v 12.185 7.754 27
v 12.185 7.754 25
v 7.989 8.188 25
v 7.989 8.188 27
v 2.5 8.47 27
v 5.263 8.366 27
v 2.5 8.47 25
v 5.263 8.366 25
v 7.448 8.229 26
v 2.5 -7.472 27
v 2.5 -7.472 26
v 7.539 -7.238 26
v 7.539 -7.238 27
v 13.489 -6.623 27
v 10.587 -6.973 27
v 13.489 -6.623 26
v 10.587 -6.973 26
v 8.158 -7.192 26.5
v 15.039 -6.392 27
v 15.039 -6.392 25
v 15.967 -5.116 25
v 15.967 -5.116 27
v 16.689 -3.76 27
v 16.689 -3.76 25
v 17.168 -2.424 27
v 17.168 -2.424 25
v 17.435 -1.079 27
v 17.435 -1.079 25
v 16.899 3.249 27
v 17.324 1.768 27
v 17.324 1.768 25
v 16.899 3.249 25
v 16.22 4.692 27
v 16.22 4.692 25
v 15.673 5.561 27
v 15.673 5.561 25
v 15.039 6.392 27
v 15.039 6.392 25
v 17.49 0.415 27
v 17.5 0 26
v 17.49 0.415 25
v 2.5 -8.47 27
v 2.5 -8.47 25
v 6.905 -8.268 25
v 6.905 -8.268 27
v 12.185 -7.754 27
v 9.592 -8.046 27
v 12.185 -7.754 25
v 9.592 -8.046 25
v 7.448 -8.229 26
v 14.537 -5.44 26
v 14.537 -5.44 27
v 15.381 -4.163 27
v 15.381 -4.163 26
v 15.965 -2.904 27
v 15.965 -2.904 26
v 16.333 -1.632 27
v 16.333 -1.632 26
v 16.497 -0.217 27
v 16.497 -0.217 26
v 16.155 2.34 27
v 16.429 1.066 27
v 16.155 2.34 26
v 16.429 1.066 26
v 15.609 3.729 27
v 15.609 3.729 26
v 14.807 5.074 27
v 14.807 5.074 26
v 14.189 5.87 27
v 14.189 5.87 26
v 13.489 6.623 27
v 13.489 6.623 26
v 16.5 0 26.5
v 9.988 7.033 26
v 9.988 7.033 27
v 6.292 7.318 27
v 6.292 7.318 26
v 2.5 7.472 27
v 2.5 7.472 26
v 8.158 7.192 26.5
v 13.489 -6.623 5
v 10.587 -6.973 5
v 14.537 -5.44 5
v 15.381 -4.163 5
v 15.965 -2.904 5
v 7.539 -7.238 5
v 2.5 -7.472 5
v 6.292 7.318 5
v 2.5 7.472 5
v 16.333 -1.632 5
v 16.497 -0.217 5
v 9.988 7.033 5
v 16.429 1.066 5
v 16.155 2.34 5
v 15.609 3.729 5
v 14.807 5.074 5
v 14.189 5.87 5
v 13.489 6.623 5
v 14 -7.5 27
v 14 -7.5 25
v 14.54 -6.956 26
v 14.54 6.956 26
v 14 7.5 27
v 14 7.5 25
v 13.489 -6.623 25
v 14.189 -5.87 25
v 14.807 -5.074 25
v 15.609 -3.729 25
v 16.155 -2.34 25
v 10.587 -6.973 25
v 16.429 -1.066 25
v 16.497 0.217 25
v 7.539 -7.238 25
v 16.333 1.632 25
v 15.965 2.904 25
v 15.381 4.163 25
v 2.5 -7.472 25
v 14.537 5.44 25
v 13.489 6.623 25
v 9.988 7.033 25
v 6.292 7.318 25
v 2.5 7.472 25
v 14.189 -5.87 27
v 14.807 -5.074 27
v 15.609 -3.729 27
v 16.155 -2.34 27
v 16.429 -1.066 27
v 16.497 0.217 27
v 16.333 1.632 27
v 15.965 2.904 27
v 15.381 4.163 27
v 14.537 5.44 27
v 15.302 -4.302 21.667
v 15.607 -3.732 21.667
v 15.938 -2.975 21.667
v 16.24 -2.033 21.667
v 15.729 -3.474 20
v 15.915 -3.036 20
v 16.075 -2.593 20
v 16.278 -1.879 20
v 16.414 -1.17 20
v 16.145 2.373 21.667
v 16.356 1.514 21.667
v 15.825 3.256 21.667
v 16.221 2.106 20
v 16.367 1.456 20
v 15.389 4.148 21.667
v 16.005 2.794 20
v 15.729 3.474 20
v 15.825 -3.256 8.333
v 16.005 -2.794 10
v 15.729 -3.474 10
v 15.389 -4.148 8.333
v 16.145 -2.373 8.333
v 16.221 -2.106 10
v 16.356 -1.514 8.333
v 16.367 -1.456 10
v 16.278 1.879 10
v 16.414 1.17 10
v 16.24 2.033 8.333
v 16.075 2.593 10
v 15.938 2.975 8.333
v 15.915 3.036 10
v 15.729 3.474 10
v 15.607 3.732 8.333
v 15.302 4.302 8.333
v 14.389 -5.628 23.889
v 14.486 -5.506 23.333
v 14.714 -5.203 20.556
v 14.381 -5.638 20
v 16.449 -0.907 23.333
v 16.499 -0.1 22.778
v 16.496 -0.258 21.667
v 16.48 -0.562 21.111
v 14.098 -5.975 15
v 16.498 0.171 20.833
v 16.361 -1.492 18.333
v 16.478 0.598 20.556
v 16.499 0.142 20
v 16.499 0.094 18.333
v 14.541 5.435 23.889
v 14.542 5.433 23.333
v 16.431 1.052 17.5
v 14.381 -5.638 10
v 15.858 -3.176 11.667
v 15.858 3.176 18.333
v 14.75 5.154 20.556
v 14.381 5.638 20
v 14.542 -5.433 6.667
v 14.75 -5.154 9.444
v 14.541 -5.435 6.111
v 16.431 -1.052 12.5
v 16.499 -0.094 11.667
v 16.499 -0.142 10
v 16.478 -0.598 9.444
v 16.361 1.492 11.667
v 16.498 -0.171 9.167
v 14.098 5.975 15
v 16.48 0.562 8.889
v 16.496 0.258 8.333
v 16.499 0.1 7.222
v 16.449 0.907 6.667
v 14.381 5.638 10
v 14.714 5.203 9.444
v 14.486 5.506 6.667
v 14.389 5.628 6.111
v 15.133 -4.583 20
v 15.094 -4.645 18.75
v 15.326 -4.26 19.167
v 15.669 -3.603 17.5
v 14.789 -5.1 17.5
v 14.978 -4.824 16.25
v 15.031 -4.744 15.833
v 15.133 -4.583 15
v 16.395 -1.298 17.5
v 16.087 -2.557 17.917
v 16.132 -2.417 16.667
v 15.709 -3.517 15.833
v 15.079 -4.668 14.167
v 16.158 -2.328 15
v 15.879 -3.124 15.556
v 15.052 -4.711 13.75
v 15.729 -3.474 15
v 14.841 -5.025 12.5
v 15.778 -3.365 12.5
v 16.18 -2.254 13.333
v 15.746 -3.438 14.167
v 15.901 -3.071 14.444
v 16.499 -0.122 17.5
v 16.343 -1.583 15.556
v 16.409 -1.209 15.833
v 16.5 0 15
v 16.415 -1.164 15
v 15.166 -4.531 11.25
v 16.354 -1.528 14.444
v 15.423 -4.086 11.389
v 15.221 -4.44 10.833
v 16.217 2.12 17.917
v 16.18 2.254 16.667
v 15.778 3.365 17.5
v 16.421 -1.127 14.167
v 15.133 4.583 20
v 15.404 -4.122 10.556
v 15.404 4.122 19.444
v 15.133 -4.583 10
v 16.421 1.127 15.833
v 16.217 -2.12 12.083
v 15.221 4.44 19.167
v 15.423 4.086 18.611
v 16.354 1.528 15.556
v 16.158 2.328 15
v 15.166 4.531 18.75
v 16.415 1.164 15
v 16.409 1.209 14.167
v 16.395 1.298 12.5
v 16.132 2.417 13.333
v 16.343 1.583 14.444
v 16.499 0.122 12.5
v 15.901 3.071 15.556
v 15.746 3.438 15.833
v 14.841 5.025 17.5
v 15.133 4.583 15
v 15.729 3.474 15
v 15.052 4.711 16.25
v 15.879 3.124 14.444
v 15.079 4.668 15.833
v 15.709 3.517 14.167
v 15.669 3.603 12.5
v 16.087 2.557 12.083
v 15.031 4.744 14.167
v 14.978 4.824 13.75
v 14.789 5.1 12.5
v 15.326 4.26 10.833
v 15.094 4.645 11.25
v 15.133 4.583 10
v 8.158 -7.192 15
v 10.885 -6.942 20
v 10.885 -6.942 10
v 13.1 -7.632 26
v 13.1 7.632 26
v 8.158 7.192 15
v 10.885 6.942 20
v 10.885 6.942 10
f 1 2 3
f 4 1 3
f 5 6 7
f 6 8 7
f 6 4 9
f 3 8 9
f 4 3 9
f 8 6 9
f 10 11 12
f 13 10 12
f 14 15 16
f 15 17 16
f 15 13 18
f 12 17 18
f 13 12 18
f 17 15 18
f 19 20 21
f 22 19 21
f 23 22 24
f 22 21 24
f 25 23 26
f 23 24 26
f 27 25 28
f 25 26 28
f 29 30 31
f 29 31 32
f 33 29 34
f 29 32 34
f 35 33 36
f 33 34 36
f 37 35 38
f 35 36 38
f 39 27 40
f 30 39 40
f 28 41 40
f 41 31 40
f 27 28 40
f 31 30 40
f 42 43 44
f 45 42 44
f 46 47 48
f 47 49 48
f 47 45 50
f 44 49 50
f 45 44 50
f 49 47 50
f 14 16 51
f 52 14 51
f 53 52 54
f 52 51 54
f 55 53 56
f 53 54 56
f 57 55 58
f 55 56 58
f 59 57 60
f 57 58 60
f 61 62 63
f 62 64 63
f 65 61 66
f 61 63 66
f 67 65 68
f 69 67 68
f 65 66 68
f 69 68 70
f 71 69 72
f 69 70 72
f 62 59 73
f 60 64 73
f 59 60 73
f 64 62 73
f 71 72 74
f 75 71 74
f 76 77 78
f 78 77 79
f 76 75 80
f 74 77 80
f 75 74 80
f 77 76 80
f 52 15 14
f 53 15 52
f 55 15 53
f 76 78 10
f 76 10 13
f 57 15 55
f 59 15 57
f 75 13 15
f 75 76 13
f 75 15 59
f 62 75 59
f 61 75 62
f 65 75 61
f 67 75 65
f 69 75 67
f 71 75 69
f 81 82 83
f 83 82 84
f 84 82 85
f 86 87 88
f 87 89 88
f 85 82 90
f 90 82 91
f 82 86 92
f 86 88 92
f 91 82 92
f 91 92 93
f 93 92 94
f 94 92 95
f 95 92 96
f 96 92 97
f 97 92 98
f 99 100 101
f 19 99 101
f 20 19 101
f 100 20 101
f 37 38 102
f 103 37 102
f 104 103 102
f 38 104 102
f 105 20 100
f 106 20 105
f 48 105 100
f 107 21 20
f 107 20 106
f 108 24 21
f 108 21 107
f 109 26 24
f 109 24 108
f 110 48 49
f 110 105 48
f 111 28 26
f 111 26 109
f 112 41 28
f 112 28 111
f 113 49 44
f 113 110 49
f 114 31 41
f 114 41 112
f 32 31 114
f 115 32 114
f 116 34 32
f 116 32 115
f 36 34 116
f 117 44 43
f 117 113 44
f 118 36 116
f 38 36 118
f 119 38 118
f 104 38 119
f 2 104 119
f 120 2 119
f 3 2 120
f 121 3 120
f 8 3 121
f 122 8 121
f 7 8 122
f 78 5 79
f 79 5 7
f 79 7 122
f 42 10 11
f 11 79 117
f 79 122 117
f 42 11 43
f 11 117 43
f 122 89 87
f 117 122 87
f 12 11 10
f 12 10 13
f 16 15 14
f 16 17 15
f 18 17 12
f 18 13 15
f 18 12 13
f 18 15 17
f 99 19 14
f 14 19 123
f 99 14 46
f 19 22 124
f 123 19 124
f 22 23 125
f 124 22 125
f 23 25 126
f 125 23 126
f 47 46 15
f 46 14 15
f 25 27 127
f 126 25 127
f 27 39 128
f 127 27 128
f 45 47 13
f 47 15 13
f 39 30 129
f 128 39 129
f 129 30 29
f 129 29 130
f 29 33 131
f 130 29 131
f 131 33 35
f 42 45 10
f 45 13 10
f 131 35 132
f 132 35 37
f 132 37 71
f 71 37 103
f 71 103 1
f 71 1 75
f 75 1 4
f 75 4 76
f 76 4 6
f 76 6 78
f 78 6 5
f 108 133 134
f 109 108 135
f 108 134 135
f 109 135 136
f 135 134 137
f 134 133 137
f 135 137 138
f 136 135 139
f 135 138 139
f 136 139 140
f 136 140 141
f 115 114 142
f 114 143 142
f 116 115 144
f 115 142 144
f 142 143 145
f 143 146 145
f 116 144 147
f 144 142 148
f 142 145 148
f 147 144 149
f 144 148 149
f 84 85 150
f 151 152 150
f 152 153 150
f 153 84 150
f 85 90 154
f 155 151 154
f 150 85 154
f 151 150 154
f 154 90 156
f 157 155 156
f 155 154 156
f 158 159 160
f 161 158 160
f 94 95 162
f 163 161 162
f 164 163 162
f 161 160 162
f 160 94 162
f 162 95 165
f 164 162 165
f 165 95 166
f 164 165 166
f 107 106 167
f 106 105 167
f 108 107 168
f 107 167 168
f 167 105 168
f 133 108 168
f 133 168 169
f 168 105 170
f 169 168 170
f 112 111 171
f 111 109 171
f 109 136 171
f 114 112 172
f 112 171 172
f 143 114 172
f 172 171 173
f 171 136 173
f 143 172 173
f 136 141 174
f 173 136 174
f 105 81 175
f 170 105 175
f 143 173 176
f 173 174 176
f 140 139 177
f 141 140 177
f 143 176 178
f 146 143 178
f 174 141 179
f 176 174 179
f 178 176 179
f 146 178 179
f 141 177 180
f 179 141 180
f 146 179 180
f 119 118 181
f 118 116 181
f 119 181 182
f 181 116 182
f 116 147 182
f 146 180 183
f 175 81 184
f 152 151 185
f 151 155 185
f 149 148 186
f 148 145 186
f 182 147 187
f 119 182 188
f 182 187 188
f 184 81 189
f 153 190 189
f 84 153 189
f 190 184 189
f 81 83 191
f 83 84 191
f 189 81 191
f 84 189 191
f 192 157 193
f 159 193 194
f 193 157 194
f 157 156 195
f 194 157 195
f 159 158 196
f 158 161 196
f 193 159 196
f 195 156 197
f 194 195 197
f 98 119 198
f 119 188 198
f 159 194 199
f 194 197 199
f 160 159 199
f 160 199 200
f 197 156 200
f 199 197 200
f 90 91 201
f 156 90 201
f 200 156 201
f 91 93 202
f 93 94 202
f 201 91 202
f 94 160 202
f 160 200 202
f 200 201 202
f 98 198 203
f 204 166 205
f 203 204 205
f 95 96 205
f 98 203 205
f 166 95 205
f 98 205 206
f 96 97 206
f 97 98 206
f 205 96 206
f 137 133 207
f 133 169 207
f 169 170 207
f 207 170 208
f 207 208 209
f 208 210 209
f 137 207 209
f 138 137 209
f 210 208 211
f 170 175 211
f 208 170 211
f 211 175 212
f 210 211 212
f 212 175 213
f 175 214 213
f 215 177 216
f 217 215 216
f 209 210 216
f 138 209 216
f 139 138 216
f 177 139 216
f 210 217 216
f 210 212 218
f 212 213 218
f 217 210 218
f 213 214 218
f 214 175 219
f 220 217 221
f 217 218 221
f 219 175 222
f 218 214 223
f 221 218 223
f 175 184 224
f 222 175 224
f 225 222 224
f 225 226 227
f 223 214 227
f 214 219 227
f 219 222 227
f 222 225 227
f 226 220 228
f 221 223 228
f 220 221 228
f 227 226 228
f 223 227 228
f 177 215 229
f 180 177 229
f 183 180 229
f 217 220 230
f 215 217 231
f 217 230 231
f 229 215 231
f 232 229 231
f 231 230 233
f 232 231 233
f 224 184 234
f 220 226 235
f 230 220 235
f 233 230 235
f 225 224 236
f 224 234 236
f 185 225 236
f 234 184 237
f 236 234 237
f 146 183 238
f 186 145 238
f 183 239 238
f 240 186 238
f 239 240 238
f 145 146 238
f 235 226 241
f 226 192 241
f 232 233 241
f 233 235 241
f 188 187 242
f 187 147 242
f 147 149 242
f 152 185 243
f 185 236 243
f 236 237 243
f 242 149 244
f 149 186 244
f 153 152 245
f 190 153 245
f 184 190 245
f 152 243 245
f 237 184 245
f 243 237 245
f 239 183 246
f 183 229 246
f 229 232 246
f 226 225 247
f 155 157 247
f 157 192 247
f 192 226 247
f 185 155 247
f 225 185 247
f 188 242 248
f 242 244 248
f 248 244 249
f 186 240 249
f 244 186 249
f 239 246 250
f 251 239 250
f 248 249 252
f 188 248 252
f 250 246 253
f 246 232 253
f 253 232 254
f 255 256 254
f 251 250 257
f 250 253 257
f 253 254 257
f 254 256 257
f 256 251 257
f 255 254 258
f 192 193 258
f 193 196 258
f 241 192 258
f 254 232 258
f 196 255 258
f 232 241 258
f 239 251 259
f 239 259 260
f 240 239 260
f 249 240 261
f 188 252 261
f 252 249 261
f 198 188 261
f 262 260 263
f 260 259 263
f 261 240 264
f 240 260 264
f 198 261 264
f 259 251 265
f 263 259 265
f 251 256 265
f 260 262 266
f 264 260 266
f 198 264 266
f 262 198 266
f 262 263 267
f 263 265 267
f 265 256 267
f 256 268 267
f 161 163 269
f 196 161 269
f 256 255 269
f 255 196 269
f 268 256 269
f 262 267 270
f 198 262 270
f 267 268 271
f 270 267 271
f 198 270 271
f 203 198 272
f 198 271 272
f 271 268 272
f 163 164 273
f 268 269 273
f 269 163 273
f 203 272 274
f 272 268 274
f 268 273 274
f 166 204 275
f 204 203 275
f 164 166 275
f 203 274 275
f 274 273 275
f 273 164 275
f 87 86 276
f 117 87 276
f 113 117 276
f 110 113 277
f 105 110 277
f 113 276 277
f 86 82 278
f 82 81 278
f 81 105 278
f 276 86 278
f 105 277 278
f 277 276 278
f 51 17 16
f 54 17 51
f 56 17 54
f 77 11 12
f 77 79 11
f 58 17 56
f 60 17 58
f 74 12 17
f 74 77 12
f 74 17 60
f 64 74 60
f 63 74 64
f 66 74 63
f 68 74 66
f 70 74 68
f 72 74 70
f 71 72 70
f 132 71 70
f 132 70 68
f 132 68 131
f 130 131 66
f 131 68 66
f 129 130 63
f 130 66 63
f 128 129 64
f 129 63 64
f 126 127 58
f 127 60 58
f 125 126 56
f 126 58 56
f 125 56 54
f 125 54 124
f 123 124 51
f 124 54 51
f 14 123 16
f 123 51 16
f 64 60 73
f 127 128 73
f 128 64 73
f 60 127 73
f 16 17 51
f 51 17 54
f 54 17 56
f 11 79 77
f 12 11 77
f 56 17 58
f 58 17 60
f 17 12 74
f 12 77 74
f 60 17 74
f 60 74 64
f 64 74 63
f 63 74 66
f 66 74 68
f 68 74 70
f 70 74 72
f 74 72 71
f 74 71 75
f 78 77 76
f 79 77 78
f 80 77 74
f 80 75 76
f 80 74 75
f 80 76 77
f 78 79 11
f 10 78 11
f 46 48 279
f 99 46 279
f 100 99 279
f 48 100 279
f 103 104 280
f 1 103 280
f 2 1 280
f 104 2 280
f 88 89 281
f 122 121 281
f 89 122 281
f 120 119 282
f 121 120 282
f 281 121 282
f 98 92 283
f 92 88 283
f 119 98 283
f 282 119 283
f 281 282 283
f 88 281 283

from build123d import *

# Parameters (mm, degrees)
F1_START = 5
F1_DEPTH = 21
F2_START = 25
F2_DEPTH = 2
F3_START = 26
F3_DEPTH = 1


with BuildPart() as f1:
    # F0 (on Top) → F1 (new body)
    with BuildSketch(Plane.XY.offset(F1_START)):
        with BuildLine():
            Line((2.5, 0), (2.5, -7.471590807))
            add(Edge.make_bspline(
                [(2.5, -7.471590807), (8.3249735983, -7.3389528818), (13.4886153342, -6.6233121014)],
                knots=[1.6578628091, 1.6578628091, 1.6578628091, 2.0591461343, 2.0591461343, 2.0591461343], degree=2, weights=[1, 0.9799388974, 1]))
            add(Edge.make_bspline(
                [(13.4886153342, -6.6233121014), (16.5, -3.6442045908), (16.5, 0)],
                knots=[5.6694315423, 5.6694315423, 5.6694315423, 6.2831853072, 6.2831853072, 6.2831853072], degree=2, weights=[1, 0.9532816579, 1]))
            Line((16.5, 0), (2.5, 0))
        make_face()
        with BuildLine():
            add(Edge.make_bspline(
                [(13.4886153342, 6.6233121014), (8.3249735983, 7.3389528818), (2.5, 7.471590807)],
                knots=[4.2240391728, 4.2240391728, 4.2240391728, 4.625322498, 4.625322498, 4.625322498], degree=2, weights=[1, 0.9799388974, 1]))
            Line((2.5, 7.471590807), (2.5, 0))
            Line((2.5, 0), (16.5, 0))
            add(Edge.make_bspline(
                [(16.5, 0), (16.5, 3.6442045908), (13.4886153342, 6.6233121014)],
                knots=[0, 0, 0, 0.6137537649, 0.6137537649, 0.6137537649], degree=2, weights=[1, 0.9532816579, 1]))
        make_face()
    extrude(amount=F1_DEPTH)

    # F0 (on Top) → F2 (join)
    with BuildSketch(Plane.XY.offset(F2_START)):
        with BuildLine():
            add(Edge.make_bspline(
                [(2.5, -7.471590807), (8.3249735983, -7.3389528818), (13.4886153342, -6.6233121014)],
                knots=[1.6578628091, 1.6578628091, 1.6578628091, 2.0591461343, 2.0591461343, 2.0591461343], degree=2, weights=[1, 0.9799388974, 1]))
            Line((2.5, -7.471590807), (2.5, -8.4699348237))
            add(Edge.make_bspline(
                [(2.5, -8.4699348237), (7.5558884443, -8.3481140554), (12.1846448126, -7.754376938)],
                knots=[1.6549291585, 1.6549291585, 1.6549291585, 1.9927766821, 1.9927766821, 1.9927766821], degree=2, weights=[1, 0.9857662766, 1]))
            add(Edge.make_bspline(
                [(12.1846448126, -7.754376938), (12.887920486, -7.217568476), (13.4886153342, -6.6233121014)],
                knots=[5.5431775409, 5.5431775409, 5.5431775409, 5.6694315423, 5.6694315423, 5.6694315423], degree=2, weights=[1, 0.9980081525, 1]))
        make_face()
        with BuildLine():
            Line((2.5, 8.4699348237), (2.5, 7.471590807))
            add(Edge.make_bspline(
                [(13.4886153342, 6.6233121014), (8.3249735983, 7.3389528818), (2.5, 7.471590807)],
                knots=[4.2240391728, 4.2240391728, 4.2240391728, 4.625322498, 4.625322498, 4.625322498], degree=2, weights=[1, 0.9799388974, 1]))
            add(Edge.make_bspline(
                [(13.4886153342, 6.6233121014), (12.887920486, 7.217568476), (12.1846448126, 7.754376938)],
                knots=[0.6137537649, 0.6137537649, 0.6137537649, 0.7400077663, 0.7400077663, 0.7400077663], degree=2, weights=[1, 0.9980081525, 1]))
            add(Edge.make_bspline(
                [(12.1846448126, 7.754376938), (7.5558884443, 8.3481140554), (2.5, 8.4699348237)],
                knots=[4.290408625, 4.290408625, 4.290408625, 4.6282561487, 4.6282561487, 4.6282561487], degree=2, weights=[1, 0.9857662766, 1]))
        make_face()
        with BuildLine():
            add(Edge.make_bspline(
                [(13.4886153342, -6.6233121014), (14.2775033671, -6.5139783257), (15.0388497278, -6.3920789177)],
                knots=[2.0591461343, 2.0591461343, 2.0591461343, 2.1212693394, 2.1212693394, 2.1212693394], degree=2, weights=[1, 0.9995176272, 1]))
            add(Edge.make_bspline(
                [(15.0388497278, -6.3920789177), (17.5, -3.4377792084), (17.5, 0)],
                knots=[2.6048186996, 2.6048186996, 2.6048186996, 3.1415926536, 3.1415926536, 3.1415926536], degree=2, weights=[1, 0.9641998863, 1]))
            Line((17.5, 0), (16.5, 0))
            add(Edge.make_bspline(
                [(13.4886153342, -6.6233121014), (16.5, -3.6442045908), (16.5, 0)],
                knots=[5.6694315423, 5.6694315423, 5.6694315423, 6.2831853072, 6.2831853072, 6.2831853072], degree=2, weights=[1, 0.9532816579, 1]))
        make_face()
        with BuildLine():
            add(Edge.make_bspline(
                [(17.5, 0), (17.5, 3.4377792084), (15.0388497278, 6.3920789177)],
                knots=[3.1415926536, 3.1415926536, 3.1415926536, 3.6783666076, 3.6783666076, 3.6783666076], degree=2, weights=[1, 0.9641998863, 1]))
            add(Edge.make_bspline(
                [(15.0388497278, 6.3920789177), (14.2775033671, 6.5139783257), (13.4886153342, 6.6233121014)],
                knots=[4.1619159677, 4.1619159677, 4.1619159677, 4.2240391728, 4.2240391728, 4.2240391728], degree=2, weights=[1, 0.9995176272, 1]))
            add(Edge.make_bspline(
                [(16.5, 0), (16.5, 3.6442045908), (13.4886153342, 6.6233121014)],
                knots=[0, 0, 0, 0.6137537649, 0.6137537649, 0.6137537649], degree=2, weights=[1, 0.9532816579, 1]))
            Line((16.5, 0), (17.5, 0))
        make_face()
        with BuildLine():
            add(Edge.make_bspline(
                [(12.1846448126, -7.754376938), (13.1074585373, -7.6360063181), (14, -7.5)],
                knots=[1.9927766821, 1.9927766821, 1.9927766821, 2.060753653, 2.060753653, 2.060753653], degree=2, weights=[1, 0.999422447, 1]))
            add(Edge.make_bspline(
                [(14, -7.5), (14.5608500358, -6.9658571088), (15.0388497278, -6.3920789177)],
                knots=[2.4980915448, 2.4980915448, 2.4980915448, 2.6048186996, 2.6048186996, 2.6048186996], degree=2, weights=[1, 0.9985765022, 1]))
            add(Edge.make_bspline(
                [(13.4886153342, -6.6233121014), (14.2775033671, -6.5139783257), (15.0388497278, -6.3920789177)],
                knots=[2.0591461343, 2.0591461343, 2.0591461343, 2.1212693394, 2.1212693394, 2.1212693394], degree=2, weights=[1, 0.9995176272, 1]))
            add(Edge.make_bspline(
                [(12.1846448126, -7.754376938), (12.887920486, -7.217568476), (13.4886153342, -6.6233121014)],
                knots=[5.5431775409, 5.5431775409, 5.5431775409, 5.6694315423, 5.6694315423, 5.6694315423], degree=2, weights=[1, 0.9980081525, 1]))
        make_face()
        with BuildLine():
            add(Edge.make_bspline(
                [(15.0388497278, 6.3920789177), (14.5608500358, 6.9658571088), (14, 7.5)],
                knots=[3.6783666076, 3.6783666076, 3.6783666076, 3.7850937624, 3.7850937624, 3.7850937624], degree=2, weights=[1, 0.9985765022, 1]))
            add(Edge.make_bspline(
                [(14, 7.5), (13.1074585373, 7.6360063181), (12.1846448126, 7.754376938)],
                knots=[4.2224316541, 4.2224316541, 4.2224316541, 4.290408625, 4.290408625, 4.290408625], degree=2, weights=[1, 0.999422447, 1]))
            add(Edge.make_bspline(
                [(13.4886153342, 6.6233121014), (12.887920486, 7.217568476), (12.1846448126, 7.754376938)],
                knots=[0.6137537649, 0.6137537649, 0.6137537649, 0.7400077663, 0.7400077663, 0.7400077663], degree=2, weights=[1, 0.9980081525, 1]))
            add(Edge.make_bspline(
                [(15.0388497278, 6.3920789177), (14.2775033671, 6.5139783257), (13.4886153342, 6.6233121014)],
                knots=[4.1619159677, 4.1619159677, 4.1619159677, 4.2240391728, 4.2240391728, 4.2240391728], degree=2, weights=[1, 0.9995176272, 1]))
        make_face()
    extrude(amount=F2_DEPTH)


with BuildPart() as f3:
    # F0 (on Top) → F3 (new body)
    with BuildSketch(Plane.XY.offset(F3_START)):
        with BuildLine():
            add(Edge.make_bspline(
                [(13.4886153342, 6.6233121014), (8.3249735983, 7.3389528818), (2.5, 7.471590807)],
                knots=[4.2240391728, 4.2240391728, 4.2240391728, 4.625322498, 4.625322498, 4.625322498], degree=2, weights=[1, 0.9799388974, 1]))
            Line((2.5, 7.471590807), (2.5, 0))
            Line((2.5, 0), (16.5, 0))
            add(Edge.make_bspline(
                [(16.5, 0), (16.5, 3.6442045908), (13.4886153342, 6.6233121014)],
                knots=[0, 0, 0, 0.6137537649, 0.6137537649, 0.6137537649], degree=2, weights=[1, 0.9532816579, 1]))
        make_face()
        with BuildLine():
            Line((2.5, 0), (2.5, -7.471590807))
            add(Edge.make_bspline(
                [(2.5, -7.471590807), (8.3249735983, -7.3389528818), (13.4886153342, -6.6233121014)],
                knots=[1.6578628091, 1.6578628091, 1.6578628091, 2.0591461343, 2.0591461343, 2.0591461343], degree=2, weights=[1, 0.9799388974, 1]))
            add(Edge.make_bspline(
                [(13.4886153342, -6.6233121014), (16.5, -3.6442045908), (16.5, 0)],
                knots=[5.6694315423, 5.6694315423, 5.6694315423, 6.2831853072, 6.2831853072, 6.2831853072], degree=2, weights=[1, 0.9532816579, 1]))
            Line((16.5, 0), (2.5, 0))
        make_face()
    extrude(amount=F3_DEPTH)


solid = Compound([f1.part, f3.part])
